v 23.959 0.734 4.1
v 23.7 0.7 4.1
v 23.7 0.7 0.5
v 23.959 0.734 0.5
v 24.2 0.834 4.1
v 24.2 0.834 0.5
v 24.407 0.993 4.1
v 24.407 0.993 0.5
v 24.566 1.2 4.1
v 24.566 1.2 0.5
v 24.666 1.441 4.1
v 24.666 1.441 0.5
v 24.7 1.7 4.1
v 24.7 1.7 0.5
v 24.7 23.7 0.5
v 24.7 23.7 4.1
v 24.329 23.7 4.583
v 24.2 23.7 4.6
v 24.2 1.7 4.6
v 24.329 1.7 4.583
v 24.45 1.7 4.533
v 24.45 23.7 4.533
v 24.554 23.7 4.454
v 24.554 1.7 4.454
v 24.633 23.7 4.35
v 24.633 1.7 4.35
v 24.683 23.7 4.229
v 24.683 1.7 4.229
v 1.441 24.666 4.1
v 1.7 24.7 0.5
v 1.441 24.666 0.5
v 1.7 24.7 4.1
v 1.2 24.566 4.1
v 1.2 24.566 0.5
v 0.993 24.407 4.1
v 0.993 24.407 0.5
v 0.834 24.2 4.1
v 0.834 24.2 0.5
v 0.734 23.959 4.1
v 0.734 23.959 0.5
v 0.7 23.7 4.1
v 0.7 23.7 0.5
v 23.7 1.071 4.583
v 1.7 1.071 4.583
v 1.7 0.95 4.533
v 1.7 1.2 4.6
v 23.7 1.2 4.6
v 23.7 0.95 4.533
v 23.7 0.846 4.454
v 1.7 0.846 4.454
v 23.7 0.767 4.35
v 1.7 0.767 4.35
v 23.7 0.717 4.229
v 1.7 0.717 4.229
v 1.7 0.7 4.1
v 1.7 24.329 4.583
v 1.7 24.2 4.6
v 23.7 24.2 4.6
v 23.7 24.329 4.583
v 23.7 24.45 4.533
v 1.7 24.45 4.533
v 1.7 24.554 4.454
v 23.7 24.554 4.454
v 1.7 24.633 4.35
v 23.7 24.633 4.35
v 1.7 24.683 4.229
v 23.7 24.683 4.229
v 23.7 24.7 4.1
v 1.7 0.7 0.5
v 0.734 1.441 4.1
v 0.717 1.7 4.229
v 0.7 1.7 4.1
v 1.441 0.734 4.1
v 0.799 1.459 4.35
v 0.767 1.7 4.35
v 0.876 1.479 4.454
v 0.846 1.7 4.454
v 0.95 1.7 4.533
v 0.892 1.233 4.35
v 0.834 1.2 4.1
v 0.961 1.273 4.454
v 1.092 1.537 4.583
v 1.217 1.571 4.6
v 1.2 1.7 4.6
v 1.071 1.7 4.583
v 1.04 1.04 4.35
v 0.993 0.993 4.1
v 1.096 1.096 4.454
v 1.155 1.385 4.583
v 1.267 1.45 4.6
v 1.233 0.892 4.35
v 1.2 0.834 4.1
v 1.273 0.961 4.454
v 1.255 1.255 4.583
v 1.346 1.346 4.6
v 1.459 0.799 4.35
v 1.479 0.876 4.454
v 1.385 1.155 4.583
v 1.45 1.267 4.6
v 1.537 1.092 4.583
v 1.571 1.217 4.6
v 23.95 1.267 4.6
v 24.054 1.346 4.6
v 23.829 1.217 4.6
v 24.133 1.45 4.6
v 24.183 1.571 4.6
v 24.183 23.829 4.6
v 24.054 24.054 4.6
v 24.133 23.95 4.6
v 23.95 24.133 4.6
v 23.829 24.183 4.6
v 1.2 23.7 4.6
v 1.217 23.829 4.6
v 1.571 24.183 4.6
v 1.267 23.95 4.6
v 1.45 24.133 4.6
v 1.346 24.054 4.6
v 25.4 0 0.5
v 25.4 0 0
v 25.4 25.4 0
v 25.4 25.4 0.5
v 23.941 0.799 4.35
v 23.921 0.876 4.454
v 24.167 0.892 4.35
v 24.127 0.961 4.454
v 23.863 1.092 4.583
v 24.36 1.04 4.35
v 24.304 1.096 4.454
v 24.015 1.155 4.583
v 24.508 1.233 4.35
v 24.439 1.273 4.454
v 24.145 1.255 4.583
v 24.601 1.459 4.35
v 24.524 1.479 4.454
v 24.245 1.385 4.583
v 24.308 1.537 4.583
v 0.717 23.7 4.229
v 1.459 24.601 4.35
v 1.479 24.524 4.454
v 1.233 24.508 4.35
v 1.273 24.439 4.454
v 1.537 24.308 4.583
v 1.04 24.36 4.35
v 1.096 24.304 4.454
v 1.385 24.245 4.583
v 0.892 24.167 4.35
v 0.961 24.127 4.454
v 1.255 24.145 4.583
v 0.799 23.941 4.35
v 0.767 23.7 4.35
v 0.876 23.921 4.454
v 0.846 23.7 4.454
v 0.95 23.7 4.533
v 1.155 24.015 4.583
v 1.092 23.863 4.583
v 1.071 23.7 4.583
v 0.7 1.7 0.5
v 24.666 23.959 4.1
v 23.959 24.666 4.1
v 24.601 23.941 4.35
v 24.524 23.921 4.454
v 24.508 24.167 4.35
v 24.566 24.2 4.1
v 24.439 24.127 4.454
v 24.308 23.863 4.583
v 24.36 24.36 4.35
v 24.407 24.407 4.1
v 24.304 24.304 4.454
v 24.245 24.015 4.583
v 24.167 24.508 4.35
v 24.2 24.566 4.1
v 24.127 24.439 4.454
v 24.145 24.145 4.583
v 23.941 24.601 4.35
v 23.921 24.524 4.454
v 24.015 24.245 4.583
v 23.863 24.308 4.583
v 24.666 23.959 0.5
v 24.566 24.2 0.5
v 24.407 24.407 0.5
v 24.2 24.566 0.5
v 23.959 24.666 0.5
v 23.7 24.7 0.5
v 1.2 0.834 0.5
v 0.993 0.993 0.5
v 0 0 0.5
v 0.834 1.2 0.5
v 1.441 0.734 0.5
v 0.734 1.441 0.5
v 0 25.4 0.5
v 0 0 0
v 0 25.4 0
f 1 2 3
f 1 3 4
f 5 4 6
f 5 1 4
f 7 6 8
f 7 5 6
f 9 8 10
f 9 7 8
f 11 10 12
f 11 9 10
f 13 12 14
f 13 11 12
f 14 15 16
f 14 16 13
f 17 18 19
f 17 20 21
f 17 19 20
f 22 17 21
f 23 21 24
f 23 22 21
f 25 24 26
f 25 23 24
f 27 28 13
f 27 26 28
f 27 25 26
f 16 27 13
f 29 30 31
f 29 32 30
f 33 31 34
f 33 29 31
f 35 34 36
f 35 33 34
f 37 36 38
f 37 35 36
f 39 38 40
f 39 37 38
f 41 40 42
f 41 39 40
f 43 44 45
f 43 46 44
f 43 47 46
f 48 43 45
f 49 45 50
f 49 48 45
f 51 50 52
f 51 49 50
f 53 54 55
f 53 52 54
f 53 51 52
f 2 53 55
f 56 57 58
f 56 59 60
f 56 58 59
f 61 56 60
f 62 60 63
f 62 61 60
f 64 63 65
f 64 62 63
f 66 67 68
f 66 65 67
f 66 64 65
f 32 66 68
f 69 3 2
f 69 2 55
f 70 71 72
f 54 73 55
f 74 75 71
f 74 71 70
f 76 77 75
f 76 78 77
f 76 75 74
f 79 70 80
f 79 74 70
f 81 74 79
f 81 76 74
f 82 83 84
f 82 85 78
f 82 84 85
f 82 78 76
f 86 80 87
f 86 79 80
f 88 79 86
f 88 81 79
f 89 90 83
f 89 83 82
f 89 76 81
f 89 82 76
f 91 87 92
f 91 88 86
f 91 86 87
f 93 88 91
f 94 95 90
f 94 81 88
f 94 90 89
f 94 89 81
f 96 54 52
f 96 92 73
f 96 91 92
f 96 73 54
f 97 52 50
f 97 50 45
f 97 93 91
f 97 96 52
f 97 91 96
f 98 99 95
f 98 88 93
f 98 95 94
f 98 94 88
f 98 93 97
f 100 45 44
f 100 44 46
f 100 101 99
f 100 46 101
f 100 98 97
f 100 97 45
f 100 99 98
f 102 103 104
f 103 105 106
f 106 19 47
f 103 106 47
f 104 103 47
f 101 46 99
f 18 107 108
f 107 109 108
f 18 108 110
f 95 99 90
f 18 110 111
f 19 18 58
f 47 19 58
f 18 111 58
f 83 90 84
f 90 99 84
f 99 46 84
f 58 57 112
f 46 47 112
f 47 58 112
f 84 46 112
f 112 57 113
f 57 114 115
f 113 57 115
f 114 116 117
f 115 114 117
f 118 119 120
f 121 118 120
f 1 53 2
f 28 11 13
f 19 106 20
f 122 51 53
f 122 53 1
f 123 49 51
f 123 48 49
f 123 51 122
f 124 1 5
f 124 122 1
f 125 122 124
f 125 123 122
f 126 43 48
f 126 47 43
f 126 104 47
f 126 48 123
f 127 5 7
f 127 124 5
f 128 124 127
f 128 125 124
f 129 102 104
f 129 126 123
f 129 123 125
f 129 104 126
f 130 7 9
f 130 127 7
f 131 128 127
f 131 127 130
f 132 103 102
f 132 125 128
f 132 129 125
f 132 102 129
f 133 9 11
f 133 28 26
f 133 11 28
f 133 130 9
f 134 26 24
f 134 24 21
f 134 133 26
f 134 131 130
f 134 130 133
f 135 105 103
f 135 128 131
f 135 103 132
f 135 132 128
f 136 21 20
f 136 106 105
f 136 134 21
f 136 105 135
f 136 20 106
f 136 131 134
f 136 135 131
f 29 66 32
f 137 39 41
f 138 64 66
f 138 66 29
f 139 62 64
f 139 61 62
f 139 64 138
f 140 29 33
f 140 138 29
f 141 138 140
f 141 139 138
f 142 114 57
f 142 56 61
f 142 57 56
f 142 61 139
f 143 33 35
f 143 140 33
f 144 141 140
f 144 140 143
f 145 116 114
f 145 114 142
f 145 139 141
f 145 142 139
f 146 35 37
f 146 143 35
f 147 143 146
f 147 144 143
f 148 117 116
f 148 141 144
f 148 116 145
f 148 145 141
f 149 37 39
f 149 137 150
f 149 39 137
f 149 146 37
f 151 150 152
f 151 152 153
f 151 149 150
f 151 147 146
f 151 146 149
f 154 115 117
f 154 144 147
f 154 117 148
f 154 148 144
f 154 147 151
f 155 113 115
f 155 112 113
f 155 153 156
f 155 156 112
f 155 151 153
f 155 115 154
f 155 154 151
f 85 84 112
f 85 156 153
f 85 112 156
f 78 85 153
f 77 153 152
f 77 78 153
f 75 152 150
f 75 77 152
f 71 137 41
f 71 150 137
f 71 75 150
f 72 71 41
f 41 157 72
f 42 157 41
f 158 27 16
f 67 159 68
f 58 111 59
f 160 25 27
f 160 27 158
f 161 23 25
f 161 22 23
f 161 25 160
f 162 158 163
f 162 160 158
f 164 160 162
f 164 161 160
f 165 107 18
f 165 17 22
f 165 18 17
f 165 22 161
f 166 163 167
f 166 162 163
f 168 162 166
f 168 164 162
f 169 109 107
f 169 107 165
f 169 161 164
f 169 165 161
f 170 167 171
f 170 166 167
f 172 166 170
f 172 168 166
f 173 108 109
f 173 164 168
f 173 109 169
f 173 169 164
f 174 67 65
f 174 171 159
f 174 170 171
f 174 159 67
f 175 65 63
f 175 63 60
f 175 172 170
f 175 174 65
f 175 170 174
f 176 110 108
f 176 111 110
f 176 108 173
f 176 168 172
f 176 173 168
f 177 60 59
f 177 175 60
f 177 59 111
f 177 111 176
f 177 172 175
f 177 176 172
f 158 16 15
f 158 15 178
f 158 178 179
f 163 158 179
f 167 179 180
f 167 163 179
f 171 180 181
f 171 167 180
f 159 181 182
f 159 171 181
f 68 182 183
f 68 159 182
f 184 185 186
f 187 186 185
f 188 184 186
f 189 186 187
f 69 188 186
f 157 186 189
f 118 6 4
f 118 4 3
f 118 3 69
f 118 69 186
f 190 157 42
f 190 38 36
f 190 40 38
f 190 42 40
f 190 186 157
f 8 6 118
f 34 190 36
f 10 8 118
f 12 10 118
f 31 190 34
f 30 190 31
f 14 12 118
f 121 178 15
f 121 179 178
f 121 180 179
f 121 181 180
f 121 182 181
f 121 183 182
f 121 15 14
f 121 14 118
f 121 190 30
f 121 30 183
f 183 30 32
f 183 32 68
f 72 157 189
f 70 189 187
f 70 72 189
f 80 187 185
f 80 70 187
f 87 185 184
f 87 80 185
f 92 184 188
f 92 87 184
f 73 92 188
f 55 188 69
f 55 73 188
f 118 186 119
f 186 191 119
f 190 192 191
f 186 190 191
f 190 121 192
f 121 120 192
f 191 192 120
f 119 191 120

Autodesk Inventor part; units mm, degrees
ref_plane "YZ Plane" through (0, 0, 0) normal (1, 0, 0) x (0, 1, 0)
ref_plane "XZ Plane" through (0, 0, 0) normal (0, 1, 0) x (-1, 0, 0)
ref_plane "XY Plane" through (0, 0, 0) normal (0, 0, 1) x (1, 0, 0)
sketch "Sketch1" plane through (0, 0, 0) normal (0, 0, 1) x (1, 0, 0)
  line L0 (0, 0) -> (25.4, 0)
  line L1 (25.4, 0) -> (25.4, 25.4)
  line L2 (25.4, 25.4) -> (0, 25.4)
  line L3 (0, 25.4) -> (0, 0)
  dimension "d0" = 25.4
  dimension "d1" = 25.4
extrude "Extrusion1" add sketch "Sketch1" along normal blind 0.5
sketch "Sketch2" plane through (0, 0, 0) normal (0, 0, -1) x (-1, 0, 0)
  line L0 (-24.7, 0.7) -> (-0.7, 0.7)
  line L1 (-0.7, 0.7) -> (-0.7, 24.7)
  line L2 (-0.7, 24.7) -> (-24.7, 24.7)
  line L3 (-24.7, 24.7) -> (-24.7, 0.7)
  line L4 (-25.4, 25.4) -> (0, 25.4) projected
  line L5 (0, 25.4) -> (0, 0) projected
  point P0 (-12.7, 24.7)
  point P1 (-12.7, 25.4)
  point P2 (-0.7, 12.7)
  point P3 (0, 12.7)
  dimension "d4" = 24
  dimension "d5" = 24
extrude "Extrusion2" add sketch "Sketch2" against normal blind 4.6
fillet "Fillet1" radius 1 4 edges at (24.7, 24.7, 2.55) (0.7, 24.7, 2.55) (0.7, 0.7, 2.55) (24.7, 0.7, 2.55)
fillet "Fillet2" radius 0.5 8 edges at (24.4071, 24.4071, 4.6) (12.7, 24.7, 4.6) (0.9929, 24.4071, 4.6) (0.7, 12.7, 4.6) (0.9929, 0.9929, 4.6) (12.7, 0.7, 4.6) (24.4071, 0.9929, 4.6) (24.7, 12.7, 4.6)
properties part number "Rubber Square 1 in" material "ABS Plastic"
